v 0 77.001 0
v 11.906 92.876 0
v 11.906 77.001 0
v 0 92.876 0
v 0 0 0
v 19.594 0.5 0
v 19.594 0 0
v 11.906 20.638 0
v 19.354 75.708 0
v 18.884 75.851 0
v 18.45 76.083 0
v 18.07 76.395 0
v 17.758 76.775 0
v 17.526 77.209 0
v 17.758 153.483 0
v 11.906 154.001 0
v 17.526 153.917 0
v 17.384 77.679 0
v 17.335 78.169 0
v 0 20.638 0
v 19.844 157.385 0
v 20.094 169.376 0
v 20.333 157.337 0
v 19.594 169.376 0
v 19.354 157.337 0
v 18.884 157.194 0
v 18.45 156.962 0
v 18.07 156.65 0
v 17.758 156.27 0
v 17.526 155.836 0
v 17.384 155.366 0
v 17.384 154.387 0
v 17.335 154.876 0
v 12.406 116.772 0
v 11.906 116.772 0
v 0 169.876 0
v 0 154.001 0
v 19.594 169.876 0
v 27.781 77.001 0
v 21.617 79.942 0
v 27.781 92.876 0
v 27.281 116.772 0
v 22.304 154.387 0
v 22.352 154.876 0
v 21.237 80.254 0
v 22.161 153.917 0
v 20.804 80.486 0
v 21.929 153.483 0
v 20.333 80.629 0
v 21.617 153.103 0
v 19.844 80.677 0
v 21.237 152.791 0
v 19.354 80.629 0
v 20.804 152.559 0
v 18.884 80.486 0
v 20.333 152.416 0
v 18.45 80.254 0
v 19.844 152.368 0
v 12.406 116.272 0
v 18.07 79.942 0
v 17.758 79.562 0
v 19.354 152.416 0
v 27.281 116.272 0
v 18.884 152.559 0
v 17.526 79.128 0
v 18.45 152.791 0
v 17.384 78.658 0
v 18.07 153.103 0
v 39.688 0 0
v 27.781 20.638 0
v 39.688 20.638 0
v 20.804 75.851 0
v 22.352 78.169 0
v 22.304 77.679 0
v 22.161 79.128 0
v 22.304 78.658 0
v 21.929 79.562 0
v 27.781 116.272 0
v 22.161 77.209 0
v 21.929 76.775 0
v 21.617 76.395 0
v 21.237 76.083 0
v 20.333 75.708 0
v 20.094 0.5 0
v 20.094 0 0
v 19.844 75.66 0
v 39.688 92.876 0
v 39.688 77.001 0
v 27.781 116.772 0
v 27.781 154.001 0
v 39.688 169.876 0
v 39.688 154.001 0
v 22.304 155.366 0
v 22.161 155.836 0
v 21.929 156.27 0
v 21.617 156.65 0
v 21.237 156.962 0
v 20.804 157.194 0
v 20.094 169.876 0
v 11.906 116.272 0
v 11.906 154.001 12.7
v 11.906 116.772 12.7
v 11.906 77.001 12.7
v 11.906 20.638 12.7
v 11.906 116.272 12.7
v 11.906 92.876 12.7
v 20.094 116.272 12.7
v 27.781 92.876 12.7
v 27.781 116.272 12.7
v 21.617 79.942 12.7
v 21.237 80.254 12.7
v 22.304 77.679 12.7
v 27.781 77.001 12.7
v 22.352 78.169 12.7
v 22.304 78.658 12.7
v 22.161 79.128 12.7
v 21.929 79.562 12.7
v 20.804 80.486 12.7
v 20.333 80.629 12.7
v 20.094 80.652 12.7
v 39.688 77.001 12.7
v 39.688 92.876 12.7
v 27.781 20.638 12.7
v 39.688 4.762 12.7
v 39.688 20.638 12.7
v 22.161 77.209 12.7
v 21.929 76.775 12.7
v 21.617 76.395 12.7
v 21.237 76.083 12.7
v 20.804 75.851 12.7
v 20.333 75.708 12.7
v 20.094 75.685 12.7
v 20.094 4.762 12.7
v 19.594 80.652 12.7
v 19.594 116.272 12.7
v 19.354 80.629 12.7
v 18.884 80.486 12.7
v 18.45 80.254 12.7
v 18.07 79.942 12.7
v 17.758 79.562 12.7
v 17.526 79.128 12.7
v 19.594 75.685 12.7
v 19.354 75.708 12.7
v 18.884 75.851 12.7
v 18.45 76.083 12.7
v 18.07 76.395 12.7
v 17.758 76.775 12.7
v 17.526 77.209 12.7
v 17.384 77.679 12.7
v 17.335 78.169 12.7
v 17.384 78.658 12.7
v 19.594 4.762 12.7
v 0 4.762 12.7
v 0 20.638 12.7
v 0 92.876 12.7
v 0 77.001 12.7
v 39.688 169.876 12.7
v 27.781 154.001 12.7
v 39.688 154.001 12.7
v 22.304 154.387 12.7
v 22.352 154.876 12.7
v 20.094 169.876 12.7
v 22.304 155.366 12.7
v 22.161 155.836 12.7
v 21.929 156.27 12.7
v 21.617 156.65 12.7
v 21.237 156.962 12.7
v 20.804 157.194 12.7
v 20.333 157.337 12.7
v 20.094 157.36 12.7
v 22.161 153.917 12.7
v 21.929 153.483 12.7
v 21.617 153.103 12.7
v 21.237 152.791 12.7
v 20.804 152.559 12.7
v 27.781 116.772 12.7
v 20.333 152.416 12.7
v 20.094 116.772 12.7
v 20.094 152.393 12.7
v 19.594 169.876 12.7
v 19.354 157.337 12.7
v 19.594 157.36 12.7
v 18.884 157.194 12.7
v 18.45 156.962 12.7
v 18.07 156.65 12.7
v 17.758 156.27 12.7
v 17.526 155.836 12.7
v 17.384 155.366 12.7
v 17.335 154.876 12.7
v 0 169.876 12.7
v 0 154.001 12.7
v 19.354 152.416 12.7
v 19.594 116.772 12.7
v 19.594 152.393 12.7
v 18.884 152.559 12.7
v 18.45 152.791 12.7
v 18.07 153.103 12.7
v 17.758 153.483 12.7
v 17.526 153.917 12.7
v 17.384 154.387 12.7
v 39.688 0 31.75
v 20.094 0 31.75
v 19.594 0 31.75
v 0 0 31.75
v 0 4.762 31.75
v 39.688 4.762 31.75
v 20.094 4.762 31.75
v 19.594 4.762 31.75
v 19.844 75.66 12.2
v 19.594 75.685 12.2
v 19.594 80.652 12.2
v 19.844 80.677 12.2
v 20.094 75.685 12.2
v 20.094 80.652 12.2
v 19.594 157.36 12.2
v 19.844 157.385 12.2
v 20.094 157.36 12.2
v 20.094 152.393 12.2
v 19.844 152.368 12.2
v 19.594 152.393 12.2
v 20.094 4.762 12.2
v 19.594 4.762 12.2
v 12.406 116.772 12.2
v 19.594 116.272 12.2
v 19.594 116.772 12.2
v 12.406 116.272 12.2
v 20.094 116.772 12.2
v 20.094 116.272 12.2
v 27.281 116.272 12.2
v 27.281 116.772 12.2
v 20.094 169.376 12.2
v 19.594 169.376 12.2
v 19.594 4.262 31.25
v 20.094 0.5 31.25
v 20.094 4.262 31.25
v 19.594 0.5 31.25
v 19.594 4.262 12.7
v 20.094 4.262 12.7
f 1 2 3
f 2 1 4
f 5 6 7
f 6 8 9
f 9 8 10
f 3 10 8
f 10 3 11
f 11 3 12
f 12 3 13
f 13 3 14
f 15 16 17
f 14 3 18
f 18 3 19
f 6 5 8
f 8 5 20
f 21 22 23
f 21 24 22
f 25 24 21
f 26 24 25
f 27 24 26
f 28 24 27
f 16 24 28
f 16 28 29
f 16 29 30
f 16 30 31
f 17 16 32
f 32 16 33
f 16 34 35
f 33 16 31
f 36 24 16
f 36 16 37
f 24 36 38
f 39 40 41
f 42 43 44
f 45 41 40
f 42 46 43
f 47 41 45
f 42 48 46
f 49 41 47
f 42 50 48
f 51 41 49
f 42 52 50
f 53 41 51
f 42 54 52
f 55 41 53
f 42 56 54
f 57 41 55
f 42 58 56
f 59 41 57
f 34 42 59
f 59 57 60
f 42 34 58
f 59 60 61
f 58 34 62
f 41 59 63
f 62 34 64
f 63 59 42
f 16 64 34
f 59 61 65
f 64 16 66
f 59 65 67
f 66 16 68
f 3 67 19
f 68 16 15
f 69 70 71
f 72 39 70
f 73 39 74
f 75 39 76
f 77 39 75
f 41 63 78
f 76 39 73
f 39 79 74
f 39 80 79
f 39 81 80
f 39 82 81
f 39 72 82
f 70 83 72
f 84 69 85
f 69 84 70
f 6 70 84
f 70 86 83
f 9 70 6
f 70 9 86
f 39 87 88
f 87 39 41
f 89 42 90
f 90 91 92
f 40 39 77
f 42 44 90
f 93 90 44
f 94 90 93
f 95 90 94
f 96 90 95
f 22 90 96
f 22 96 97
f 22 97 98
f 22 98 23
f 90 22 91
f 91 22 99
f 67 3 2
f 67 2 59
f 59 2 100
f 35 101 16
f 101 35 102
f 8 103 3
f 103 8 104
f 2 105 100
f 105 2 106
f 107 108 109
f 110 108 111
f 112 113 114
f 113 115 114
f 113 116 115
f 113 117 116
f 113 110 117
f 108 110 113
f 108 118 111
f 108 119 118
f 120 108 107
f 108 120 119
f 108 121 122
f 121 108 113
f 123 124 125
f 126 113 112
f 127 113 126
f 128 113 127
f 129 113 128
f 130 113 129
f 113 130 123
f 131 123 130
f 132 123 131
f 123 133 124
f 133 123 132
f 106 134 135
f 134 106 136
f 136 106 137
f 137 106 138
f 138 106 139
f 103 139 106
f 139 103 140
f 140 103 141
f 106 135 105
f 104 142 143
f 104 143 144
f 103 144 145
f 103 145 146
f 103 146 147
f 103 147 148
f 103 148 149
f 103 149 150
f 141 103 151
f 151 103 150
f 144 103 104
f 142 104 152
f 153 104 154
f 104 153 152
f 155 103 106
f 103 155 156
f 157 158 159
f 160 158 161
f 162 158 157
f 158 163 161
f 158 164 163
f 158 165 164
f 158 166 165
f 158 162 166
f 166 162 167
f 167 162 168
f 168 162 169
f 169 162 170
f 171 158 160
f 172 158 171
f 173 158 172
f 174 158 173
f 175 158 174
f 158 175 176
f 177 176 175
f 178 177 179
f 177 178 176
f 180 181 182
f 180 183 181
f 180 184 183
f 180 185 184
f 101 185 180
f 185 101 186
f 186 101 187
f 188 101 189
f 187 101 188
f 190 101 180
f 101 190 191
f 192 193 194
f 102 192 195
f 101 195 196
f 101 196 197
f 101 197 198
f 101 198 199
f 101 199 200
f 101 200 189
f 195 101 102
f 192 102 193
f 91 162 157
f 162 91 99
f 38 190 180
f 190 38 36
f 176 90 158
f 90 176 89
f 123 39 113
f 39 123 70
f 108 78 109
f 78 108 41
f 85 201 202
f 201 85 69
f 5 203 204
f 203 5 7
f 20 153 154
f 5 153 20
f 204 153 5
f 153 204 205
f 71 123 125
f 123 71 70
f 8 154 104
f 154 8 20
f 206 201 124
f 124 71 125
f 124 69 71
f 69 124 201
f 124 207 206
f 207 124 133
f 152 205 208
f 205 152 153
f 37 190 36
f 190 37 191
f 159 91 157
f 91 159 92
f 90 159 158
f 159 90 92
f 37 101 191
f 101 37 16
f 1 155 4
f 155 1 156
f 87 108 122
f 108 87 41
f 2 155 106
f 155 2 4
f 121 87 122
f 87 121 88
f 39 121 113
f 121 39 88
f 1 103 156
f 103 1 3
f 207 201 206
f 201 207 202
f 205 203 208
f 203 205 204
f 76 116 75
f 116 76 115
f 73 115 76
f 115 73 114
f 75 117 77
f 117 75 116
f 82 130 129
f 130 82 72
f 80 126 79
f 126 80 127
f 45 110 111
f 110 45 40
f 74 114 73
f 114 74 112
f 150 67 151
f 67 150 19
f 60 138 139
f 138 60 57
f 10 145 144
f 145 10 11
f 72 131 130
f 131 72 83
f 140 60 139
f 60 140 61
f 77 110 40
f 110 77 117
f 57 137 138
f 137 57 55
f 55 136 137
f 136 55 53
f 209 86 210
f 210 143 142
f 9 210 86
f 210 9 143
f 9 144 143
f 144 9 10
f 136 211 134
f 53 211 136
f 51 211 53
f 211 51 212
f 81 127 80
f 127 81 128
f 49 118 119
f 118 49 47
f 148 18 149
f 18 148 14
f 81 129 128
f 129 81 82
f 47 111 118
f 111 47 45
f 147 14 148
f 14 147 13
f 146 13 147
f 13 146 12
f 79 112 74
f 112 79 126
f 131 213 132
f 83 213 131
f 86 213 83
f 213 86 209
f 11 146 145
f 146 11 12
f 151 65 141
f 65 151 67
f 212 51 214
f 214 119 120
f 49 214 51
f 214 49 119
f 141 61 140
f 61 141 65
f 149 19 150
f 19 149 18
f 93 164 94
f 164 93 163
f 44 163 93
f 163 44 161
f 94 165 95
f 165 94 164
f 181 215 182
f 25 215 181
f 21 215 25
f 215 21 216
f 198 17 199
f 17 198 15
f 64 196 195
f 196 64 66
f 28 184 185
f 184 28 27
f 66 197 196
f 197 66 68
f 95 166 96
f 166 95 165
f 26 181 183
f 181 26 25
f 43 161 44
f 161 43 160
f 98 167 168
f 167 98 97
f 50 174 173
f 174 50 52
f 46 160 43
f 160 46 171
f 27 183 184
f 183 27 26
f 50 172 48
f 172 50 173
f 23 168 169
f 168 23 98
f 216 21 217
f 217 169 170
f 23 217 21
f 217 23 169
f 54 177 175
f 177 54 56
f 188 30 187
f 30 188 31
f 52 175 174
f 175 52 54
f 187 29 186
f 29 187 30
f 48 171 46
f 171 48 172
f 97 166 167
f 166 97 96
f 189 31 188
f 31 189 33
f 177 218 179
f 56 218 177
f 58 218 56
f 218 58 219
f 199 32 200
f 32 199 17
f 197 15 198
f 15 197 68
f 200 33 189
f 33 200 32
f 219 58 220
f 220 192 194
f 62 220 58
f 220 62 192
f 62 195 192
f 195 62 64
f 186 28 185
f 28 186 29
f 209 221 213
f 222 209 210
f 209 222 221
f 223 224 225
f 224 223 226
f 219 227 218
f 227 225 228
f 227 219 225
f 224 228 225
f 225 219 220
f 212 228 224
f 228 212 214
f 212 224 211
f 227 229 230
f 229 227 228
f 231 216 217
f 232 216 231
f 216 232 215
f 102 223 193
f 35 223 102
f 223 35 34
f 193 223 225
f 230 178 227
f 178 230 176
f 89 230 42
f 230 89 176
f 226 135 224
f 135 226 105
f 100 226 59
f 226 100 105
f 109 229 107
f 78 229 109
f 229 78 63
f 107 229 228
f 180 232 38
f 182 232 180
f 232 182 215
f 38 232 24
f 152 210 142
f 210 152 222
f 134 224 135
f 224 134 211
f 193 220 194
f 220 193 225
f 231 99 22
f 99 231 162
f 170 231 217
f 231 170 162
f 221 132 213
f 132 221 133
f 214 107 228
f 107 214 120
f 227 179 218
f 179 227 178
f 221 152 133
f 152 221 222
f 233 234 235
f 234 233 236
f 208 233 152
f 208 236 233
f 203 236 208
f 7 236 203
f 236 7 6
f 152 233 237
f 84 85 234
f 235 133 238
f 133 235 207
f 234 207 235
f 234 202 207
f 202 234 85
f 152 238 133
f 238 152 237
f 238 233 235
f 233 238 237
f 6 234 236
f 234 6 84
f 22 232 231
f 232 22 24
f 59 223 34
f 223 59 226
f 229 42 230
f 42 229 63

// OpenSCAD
//Changelog:


$fa=6*1;
$fs=0.5*1;

// Stile Width (in mm)
x_mm=39.6875;

// Bottom Hole (in mm)
y_mm=73.406; 

// Plate Thickness (in mm)
z_mm=12.7;

// Lip Thickness (in mm)
lip_mm=4.7625;

// Hole Diameter (in mm)
d_mm=5.0165; 

// Center to Center in mm
CTC_mm=76.708;

// Width of center rail (in mm)
a_mm=15.875;

mm_per_inch=25.4*1;
  

//total_height=(CTC+1+z_in)*mm_per_inch;
difference()
{
    union() {
    
    // build center rail
    linear_extrude(z_mm) 
    translate([(x_mm/2)-(a_mm/2),0,0])   
    square([a_mm, (lip_mm+y_mm+CTC_mm+15)]);    
    
    // build crossbeams
    linear_extrude(z_mm) 
    translate([0,lip_mm,0])   
    square([x_mm, a_mm]);
        
    linear_extrude(z_mm) 
    translate([0,lip_mm+y_mm+CTC_mm+15-a_mm,0])   
    square([x_mm, a_mm]);
        
    linear_extrude(z_mm) 
    translate([0,((lip_mm+y_mm+CTC_mm+15)/2)-(a_mm/2),0])   
    square([x_mm, a_mm]);    
        
    // build main plate
    //linear_extrude(z_mm) 
    //square([x_mm, (lip_mm+y_mm+CTC_mm+15)]);

    // build lip
    //translate([0,0,z_mm]) 
    linear_extrude((0.75*mm_per_inch)+z_mm) 
    square([x_mm, (lip_mm)]);
    }

    // Drill bottom hole
    translate ([(x_mm/2), (lip_mm+y_mm), 0])
    cylinder(h=z_mm*4, d=d_mm, center=true);


    // Drill top hole
    translate ([(x_mm/2), (lip_mm+y_mm+CTC_mm), 0])
    cylinder(h=z_mm*4, d=d_mm, center=true);
    
    // Draw Centerline Mark #1
    translate ([0, lip_mm+y_mm+(CTC_mm/2)-(0.5/2), z_mm-0.5])
    linear_extrude(0.5)
    square([x_mm, 0.5]);

    // Draw Centerline Mark #2
    translate ([(x_mm/2)-(0.5/2), lip_mm, z_mm-0.5])
    linear_extrude(0.5)
    square([0.5,(y_mm+CTC_mm+15)]);
    
    // Draw Centerline Mark #3
    translate ([(x_mm/2)-(0.5/2), 0, (0.75*mm_per_inch)+z_mm-0.5])
    linear_extrude(0.5)
    square([0.5,(lip_mm)]);
    
    // Draw Centerline Mark #4
    translate ([(x_mm/2)-(0.5/2), lip_mm-0.5, z_mm])
    linear_extrude((0.75*mm_per_inch))
    square([0.5,0.5]);
    
    // Draw Centerline Mark #5
    translate ([(x_mm/2)-(0.5/2), 0, 0])
    linear_extrude(z_mm+(0.75*mm_per_inch))
    square([0.5,0.5]);
    
    // Draw Centerline Mark #6
    translate ([(x_mm/2)-(0.5/2), lip_mm+y_mm+CTC_mm+15-0.5, 0])
    linear_extrude(z_mm)
    square([0.5,0.5]);
    
    // Draw Centerline Mark #7 Horizontal Left Side
    translate ([(x_mm/2)-(a_mm/2), lip_mm+y_mm+(CTC_mm/2)-(0.5/2), 0])
    linear_extrude(z_mm)
    square([0.5,0.5]);
    
    // Draw Centerline Mark #8 Horizontal Right Side
    translate ([(x_mm/2)+(a_mm/2)-0.5, lip_mm+y_mm+(CTC_mm/2)-(0.5/2), 0])
    linear_extrude(z_mm)
    square([0.5,0.5]);
}
